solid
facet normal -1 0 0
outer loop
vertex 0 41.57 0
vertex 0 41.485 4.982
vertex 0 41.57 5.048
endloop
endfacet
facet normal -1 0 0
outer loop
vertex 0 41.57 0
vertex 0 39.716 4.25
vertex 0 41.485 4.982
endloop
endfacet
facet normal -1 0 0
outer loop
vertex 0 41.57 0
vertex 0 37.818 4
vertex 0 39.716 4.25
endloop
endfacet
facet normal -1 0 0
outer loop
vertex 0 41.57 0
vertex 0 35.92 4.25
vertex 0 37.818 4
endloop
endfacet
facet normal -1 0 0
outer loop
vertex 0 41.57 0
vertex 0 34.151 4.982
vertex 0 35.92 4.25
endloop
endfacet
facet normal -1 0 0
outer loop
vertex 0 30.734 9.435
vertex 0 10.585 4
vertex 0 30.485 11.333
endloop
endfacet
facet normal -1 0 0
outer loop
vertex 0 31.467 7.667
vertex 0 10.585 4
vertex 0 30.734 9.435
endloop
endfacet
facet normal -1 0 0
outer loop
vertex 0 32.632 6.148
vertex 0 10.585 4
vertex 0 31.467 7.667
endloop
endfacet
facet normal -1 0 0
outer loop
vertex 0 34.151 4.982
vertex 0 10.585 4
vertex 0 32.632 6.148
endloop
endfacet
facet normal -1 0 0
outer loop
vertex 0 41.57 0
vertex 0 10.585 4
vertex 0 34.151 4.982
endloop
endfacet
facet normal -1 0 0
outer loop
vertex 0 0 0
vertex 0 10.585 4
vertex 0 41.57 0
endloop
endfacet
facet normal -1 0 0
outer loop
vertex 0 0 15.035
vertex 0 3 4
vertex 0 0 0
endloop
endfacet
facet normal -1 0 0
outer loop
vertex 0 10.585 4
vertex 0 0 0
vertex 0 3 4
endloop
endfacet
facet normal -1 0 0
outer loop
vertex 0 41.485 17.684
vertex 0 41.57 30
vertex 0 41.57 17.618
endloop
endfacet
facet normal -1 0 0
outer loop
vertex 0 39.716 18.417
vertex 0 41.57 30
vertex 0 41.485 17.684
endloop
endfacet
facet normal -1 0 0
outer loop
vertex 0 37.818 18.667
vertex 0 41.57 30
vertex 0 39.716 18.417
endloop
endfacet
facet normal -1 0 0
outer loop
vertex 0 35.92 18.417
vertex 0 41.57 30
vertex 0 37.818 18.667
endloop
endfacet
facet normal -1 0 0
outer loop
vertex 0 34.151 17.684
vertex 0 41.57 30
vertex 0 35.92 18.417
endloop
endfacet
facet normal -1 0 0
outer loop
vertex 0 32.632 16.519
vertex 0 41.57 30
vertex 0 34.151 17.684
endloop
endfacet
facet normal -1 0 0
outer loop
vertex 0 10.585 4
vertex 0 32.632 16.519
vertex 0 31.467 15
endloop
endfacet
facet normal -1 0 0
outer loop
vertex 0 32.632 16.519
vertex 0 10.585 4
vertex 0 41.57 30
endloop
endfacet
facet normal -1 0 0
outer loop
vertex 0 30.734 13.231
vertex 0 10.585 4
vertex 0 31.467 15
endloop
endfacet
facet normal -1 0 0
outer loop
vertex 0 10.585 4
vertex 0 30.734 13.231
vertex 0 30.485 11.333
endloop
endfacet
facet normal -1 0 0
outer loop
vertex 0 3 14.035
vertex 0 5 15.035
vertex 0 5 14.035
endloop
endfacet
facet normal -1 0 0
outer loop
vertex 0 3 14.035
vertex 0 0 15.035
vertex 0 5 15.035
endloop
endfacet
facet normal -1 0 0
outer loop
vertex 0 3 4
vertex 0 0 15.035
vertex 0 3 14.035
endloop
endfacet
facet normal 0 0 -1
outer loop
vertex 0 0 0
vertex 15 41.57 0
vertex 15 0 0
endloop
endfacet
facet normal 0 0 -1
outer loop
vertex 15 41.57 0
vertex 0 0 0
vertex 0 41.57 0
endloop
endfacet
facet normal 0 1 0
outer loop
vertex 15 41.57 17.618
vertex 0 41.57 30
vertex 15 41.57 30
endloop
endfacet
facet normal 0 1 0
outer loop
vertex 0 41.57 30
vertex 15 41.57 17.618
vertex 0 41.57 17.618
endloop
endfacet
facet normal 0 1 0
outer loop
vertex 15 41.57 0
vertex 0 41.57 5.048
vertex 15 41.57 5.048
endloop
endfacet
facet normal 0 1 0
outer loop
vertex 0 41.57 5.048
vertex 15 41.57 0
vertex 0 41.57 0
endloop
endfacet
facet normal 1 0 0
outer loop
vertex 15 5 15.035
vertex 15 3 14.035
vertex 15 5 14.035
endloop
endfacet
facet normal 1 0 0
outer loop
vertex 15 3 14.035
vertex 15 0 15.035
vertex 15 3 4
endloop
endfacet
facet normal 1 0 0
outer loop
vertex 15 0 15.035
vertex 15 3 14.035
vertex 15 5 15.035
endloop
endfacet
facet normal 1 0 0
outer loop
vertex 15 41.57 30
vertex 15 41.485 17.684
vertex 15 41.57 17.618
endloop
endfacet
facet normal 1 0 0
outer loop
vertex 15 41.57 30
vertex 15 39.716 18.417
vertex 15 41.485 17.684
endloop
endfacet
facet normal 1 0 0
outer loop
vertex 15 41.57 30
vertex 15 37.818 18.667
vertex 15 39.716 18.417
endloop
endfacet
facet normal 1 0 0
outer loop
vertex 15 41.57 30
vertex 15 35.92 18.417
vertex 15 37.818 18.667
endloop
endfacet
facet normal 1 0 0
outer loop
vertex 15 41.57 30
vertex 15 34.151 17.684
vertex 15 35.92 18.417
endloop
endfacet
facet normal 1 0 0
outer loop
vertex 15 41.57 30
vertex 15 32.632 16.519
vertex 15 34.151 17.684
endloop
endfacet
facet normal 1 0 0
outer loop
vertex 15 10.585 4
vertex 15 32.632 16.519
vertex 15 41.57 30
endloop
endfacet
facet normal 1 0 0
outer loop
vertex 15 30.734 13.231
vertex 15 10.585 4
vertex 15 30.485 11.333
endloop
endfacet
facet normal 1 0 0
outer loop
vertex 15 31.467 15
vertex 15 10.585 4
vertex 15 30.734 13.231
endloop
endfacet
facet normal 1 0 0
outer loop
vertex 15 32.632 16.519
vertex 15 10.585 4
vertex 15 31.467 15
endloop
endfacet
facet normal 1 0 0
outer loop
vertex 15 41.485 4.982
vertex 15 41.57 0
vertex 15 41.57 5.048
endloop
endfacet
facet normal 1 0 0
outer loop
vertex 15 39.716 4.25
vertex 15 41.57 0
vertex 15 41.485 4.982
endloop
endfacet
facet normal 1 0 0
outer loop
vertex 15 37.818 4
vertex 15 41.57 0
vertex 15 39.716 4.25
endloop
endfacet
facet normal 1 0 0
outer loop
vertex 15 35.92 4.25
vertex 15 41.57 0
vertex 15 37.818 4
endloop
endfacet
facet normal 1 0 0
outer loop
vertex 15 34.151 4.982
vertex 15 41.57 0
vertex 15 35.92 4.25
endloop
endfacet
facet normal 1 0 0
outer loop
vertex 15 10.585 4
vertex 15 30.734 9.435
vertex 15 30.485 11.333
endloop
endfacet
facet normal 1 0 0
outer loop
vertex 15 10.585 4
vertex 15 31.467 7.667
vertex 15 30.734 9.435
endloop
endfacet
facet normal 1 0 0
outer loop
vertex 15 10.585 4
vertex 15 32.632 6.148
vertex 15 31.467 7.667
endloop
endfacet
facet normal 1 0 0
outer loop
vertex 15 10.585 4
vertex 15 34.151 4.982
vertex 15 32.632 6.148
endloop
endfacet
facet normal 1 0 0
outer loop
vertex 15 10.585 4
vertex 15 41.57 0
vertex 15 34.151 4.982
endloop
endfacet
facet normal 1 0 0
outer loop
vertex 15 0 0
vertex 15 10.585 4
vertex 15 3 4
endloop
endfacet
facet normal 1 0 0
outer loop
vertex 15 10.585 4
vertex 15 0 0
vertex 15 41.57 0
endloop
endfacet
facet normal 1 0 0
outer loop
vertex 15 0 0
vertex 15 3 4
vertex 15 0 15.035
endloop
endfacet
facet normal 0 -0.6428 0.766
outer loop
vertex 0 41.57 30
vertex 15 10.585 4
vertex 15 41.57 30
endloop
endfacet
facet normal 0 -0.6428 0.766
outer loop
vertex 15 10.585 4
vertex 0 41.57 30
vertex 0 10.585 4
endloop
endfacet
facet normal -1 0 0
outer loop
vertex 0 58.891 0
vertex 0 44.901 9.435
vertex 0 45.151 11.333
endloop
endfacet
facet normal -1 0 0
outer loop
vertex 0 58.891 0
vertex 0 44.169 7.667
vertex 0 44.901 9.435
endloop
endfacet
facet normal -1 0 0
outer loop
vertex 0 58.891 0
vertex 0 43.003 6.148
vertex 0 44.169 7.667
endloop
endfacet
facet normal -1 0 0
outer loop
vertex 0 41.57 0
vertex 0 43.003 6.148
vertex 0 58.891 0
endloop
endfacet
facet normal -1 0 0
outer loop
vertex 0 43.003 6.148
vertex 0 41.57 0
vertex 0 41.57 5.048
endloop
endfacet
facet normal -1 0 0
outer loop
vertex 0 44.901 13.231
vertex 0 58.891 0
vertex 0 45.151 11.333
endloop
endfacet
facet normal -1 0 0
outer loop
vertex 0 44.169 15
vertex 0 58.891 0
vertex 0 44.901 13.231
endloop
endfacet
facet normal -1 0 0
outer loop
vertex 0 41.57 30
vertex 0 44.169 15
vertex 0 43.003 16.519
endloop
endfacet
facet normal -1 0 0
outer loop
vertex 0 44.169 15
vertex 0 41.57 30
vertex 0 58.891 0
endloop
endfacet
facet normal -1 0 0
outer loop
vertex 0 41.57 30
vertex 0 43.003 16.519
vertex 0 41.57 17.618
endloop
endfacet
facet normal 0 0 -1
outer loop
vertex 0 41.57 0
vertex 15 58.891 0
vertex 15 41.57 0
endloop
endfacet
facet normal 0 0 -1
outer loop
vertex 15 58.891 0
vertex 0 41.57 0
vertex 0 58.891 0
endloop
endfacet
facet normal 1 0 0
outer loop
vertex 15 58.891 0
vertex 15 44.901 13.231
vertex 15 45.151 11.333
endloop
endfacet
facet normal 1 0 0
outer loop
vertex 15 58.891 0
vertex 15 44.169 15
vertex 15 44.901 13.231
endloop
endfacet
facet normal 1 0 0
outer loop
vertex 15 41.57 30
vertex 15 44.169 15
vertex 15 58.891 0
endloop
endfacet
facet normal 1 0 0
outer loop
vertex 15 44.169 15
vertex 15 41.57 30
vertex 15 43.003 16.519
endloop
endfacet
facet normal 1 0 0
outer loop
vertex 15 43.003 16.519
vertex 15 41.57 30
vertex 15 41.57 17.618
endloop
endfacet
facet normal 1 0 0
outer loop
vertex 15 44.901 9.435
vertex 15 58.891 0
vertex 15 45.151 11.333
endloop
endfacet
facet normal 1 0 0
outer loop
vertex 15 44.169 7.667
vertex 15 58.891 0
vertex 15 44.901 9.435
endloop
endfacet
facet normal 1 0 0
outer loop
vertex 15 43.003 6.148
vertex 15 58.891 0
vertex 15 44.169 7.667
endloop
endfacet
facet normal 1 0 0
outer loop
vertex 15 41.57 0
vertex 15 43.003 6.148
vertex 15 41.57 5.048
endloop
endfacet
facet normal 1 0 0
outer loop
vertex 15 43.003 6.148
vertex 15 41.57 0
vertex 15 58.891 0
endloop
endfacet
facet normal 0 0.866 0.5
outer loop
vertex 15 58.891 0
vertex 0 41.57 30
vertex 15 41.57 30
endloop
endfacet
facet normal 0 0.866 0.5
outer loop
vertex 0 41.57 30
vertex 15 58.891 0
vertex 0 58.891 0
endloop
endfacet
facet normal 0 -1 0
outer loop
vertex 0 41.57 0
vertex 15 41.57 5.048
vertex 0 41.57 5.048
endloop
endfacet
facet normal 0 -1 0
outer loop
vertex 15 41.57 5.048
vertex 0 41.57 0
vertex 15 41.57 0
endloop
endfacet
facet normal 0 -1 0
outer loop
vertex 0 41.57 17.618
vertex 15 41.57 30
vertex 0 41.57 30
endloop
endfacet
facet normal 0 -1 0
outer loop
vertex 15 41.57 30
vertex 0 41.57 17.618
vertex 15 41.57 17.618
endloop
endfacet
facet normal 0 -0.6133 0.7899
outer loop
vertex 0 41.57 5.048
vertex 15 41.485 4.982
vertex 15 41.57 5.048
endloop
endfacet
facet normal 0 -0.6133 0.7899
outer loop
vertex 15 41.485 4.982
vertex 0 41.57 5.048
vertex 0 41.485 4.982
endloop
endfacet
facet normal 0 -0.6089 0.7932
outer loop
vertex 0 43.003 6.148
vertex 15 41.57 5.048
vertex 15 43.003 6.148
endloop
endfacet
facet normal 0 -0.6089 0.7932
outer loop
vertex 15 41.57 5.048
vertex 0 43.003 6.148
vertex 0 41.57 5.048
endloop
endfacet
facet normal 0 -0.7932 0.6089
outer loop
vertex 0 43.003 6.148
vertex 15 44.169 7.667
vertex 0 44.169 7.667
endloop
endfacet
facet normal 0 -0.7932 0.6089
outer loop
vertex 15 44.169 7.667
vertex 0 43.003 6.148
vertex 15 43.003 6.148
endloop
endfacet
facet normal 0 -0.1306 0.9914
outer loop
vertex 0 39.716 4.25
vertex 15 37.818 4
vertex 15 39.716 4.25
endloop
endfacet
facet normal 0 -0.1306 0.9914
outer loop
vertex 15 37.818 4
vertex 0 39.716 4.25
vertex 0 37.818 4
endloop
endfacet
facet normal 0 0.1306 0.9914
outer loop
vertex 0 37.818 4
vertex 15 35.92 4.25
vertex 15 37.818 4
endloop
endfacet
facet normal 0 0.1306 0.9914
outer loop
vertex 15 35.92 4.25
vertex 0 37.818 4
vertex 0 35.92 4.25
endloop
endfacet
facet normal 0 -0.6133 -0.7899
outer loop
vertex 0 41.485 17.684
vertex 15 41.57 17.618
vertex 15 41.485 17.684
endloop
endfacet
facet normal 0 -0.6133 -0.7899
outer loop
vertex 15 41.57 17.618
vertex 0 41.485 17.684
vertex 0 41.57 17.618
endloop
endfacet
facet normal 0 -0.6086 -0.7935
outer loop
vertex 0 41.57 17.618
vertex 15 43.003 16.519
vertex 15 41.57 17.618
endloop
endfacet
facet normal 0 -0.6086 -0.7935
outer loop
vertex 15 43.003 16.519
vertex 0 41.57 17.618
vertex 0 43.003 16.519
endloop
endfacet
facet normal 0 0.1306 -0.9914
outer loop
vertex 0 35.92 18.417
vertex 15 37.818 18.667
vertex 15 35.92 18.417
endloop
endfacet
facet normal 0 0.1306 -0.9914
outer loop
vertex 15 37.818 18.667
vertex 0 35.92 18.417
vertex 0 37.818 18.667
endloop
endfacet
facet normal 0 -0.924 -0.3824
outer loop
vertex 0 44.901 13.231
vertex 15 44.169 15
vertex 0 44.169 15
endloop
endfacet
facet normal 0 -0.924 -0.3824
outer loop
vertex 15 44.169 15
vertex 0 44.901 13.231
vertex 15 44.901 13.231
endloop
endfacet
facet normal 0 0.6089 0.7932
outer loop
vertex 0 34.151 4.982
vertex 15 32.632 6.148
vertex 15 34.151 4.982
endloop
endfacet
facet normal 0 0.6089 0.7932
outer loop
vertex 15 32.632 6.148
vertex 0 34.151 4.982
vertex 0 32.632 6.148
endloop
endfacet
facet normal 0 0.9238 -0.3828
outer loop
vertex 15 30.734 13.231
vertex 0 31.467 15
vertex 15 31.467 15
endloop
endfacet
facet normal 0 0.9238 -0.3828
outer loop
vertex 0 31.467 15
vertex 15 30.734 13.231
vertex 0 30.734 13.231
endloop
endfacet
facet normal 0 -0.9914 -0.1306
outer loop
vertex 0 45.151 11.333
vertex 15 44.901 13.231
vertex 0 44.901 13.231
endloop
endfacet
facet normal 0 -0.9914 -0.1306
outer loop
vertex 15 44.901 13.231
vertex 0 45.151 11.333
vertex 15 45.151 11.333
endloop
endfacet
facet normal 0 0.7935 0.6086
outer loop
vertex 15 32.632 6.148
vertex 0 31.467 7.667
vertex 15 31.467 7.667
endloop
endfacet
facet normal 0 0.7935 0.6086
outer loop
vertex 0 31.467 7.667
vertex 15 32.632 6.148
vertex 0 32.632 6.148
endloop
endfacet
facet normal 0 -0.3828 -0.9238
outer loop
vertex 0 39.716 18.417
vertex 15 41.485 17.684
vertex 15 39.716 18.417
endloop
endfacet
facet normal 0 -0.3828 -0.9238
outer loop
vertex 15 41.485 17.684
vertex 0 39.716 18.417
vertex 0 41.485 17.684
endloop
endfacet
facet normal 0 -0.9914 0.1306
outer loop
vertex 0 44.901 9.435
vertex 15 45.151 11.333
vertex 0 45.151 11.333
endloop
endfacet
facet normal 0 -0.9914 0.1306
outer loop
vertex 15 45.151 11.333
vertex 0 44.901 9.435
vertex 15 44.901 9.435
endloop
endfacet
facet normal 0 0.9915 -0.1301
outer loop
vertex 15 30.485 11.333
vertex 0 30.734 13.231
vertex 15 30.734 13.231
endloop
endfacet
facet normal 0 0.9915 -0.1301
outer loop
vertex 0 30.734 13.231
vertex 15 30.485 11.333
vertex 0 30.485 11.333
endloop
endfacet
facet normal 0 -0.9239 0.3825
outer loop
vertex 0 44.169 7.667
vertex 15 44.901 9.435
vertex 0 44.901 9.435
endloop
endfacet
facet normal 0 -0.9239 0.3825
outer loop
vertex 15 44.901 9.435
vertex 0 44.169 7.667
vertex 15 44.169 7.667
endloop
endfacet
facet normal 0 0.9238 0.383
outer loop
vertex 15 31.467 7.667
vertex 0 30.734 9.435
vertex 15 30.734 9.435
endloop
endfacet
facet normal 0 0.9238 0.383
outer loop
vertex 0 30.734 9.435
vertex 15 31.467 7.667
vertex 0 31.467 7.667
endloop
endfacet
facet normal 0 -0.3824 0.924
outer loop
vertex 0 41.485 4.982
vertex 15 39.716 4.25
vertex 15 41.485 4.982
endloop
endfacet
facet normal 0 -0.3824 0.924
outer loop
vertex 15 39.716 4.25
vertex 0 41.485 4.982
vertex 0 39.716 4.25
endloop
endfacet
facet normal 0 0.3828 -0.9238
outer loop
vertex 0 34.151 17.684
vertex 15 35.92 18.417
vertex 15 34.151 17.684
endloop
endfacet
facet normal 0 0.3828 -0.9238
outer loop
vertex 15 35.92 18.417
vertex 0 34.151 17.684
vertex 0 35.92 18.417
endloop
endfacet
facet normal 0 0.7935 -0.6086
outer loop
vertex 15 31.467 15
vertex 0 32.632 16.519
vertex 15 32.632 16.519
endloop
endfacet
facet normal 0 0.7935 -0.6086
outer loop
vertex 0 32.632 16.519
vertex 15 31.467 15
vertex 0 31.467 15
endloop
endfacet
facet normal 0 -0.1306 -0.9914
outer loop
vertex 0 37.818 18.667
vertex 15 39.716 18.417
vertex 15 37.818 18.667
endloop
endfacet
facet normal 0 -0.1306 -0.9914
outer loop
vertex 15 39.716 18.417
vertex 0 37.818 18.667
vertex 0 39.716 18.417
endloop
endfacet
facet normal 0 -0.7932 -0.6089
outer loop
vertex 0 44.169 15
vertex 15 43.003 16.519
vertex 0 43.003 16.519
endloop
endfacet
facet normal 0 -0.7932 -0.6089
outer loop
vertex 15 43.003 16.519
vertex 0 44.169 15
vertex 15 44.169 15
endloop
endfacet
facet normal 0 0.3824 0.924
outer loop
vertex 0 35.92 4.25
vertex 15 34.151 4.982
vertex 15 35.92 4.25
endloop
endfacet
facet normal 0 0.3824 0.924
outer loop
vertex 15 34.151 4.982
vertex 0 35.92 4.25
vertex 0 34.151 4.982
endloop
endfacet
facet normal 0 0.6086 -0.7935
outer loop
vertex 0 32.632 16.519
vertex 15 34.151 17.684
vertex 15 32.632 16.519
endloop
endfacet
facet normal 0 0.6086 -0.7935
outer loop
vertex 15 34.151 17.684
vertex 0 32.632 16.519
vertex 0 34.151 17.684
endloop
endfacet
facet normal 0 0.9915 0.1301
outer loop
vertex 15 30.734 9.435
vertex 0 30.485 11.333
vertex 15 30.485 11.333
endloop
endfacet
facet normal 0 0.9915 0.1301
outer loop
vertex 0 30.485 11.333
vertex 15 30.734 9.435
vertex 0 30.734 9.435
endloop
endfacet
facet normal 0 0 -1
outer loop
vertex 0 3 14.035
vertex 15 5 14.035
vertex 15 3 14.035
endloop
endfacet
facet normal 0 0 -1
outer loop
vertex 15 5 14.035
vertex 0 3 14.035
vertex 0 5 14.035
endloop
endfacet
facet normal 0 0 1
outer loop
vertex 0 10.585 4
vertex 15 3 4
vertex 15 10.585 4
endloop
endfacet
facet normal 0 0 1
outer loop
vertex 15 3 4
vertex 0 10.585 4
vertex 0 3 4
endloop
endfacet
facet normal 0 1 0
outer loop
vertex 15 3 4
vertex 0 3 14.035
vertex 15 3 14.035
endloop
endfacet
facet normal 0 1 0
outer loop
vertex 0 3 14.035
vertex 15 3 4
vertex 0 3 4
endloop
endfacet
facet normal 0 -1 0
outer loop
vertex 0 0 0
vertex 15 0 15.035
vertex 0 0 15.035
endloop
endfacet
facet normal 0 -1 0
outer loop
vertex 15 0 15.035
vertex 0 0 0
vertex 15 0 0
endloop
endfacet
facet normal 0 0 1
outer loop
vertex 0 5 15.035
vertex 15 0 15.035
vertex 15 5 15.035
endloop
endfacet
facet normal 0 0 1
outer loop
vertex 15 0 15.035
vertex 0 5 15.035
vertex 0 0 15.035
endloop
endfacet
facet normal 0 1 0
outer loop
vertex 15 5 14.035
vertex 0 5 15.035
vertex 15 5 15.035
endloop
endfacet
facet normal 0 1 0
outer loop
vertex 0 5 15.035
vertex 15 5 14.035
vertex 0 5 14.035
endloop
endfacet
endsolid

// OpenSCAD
// Thickness of phone (incl. case) that will fit into clip.
phone_thickness = 11.8;
// Width of stand - wider will be more stable
stand_width = 15;
// Angle (in degrees) that phone will sit
phone_angle = 40;

/* [Advanced] */
// How high off the surface the stand should rise
stand_height = 30;
// How much leeway to allow around phone thickness
wiggle = 1.3;
// Overhang at the front of clip. Reduce if there is not a case to grab
hat_overhang = 2;
// How far back to place the hollow circle
hollow_offset = 32;

/* [Hidden] */
// Thickness of bottom layer
base_height = 4;

front_lip_height = (phone_thickness + wiggle) * sin(90-phone_angle);
front_lip_thickness = 3;

base_length = phone_thickness * sin(phone_angle);
extra = 1;

// for ghost image only
phone_width = 130;
phone_height = 65;


base();
tilt();
front_lip();
phone_ghost();


module base(){
  cube([stand_width, base_length + front_lip_thickness, base_height]);
}

module tilt(){
  overlap = base_height * sin(90-phone_angle) / sin(phone_angle);
  tilt_offset = front_lip_thickness + base_length - overlap;

  translate([0, tilt_offset, 0]) {
    difference(){
    union(){
    ramp(phone_angle, height=stand_height, width=stand_width);

    //back support
    translate([0, stand_height * sin(90-phone_angle) / sin(phone_angle), 0])
    ramp(-60, height=stand_height, width=stand_width);
    }

    //hollow
    hollow_radius= (stand_height - 2*base_height) / 3;
    translate([-extra, hollow_offset, base_height + hollow_radius])
    rotate([0, 90, 0])
    cylinder(r=hollow_radius, h=stand_width + extra * 2);
    }
  }
}

module front_lip(){
  translate([0, 0, base_height]) {
    cube([stand_width, front_lip_thickness, front_lip_height]);
    //hat
    translate([0, 0,front_lip_height])
      cube([stand_width, front_lip_thickness + hat_overhang, 1]);
  }
}

module phone_ghost(){
  translate([-(phone_width - stand_width)/2, front_lip_thickness + base_length, base_height])

  rotate([phone_angle - 90])
  translate([0, -phone_thickness, 0])
  %cube([phone_width, phone_thickness, phone_height]);
}

module ramp(angle, height, width){

  base = height * sin(90-angle) / sin(angle);
  shift = angle < 0 ? -base : 0;

  translate([0, shift, 0])
  rotate([90, 0, 90])
  linear_extrude(height=width)
  polygon([ [0, 0], [base,0], [base, height] ]);
}
